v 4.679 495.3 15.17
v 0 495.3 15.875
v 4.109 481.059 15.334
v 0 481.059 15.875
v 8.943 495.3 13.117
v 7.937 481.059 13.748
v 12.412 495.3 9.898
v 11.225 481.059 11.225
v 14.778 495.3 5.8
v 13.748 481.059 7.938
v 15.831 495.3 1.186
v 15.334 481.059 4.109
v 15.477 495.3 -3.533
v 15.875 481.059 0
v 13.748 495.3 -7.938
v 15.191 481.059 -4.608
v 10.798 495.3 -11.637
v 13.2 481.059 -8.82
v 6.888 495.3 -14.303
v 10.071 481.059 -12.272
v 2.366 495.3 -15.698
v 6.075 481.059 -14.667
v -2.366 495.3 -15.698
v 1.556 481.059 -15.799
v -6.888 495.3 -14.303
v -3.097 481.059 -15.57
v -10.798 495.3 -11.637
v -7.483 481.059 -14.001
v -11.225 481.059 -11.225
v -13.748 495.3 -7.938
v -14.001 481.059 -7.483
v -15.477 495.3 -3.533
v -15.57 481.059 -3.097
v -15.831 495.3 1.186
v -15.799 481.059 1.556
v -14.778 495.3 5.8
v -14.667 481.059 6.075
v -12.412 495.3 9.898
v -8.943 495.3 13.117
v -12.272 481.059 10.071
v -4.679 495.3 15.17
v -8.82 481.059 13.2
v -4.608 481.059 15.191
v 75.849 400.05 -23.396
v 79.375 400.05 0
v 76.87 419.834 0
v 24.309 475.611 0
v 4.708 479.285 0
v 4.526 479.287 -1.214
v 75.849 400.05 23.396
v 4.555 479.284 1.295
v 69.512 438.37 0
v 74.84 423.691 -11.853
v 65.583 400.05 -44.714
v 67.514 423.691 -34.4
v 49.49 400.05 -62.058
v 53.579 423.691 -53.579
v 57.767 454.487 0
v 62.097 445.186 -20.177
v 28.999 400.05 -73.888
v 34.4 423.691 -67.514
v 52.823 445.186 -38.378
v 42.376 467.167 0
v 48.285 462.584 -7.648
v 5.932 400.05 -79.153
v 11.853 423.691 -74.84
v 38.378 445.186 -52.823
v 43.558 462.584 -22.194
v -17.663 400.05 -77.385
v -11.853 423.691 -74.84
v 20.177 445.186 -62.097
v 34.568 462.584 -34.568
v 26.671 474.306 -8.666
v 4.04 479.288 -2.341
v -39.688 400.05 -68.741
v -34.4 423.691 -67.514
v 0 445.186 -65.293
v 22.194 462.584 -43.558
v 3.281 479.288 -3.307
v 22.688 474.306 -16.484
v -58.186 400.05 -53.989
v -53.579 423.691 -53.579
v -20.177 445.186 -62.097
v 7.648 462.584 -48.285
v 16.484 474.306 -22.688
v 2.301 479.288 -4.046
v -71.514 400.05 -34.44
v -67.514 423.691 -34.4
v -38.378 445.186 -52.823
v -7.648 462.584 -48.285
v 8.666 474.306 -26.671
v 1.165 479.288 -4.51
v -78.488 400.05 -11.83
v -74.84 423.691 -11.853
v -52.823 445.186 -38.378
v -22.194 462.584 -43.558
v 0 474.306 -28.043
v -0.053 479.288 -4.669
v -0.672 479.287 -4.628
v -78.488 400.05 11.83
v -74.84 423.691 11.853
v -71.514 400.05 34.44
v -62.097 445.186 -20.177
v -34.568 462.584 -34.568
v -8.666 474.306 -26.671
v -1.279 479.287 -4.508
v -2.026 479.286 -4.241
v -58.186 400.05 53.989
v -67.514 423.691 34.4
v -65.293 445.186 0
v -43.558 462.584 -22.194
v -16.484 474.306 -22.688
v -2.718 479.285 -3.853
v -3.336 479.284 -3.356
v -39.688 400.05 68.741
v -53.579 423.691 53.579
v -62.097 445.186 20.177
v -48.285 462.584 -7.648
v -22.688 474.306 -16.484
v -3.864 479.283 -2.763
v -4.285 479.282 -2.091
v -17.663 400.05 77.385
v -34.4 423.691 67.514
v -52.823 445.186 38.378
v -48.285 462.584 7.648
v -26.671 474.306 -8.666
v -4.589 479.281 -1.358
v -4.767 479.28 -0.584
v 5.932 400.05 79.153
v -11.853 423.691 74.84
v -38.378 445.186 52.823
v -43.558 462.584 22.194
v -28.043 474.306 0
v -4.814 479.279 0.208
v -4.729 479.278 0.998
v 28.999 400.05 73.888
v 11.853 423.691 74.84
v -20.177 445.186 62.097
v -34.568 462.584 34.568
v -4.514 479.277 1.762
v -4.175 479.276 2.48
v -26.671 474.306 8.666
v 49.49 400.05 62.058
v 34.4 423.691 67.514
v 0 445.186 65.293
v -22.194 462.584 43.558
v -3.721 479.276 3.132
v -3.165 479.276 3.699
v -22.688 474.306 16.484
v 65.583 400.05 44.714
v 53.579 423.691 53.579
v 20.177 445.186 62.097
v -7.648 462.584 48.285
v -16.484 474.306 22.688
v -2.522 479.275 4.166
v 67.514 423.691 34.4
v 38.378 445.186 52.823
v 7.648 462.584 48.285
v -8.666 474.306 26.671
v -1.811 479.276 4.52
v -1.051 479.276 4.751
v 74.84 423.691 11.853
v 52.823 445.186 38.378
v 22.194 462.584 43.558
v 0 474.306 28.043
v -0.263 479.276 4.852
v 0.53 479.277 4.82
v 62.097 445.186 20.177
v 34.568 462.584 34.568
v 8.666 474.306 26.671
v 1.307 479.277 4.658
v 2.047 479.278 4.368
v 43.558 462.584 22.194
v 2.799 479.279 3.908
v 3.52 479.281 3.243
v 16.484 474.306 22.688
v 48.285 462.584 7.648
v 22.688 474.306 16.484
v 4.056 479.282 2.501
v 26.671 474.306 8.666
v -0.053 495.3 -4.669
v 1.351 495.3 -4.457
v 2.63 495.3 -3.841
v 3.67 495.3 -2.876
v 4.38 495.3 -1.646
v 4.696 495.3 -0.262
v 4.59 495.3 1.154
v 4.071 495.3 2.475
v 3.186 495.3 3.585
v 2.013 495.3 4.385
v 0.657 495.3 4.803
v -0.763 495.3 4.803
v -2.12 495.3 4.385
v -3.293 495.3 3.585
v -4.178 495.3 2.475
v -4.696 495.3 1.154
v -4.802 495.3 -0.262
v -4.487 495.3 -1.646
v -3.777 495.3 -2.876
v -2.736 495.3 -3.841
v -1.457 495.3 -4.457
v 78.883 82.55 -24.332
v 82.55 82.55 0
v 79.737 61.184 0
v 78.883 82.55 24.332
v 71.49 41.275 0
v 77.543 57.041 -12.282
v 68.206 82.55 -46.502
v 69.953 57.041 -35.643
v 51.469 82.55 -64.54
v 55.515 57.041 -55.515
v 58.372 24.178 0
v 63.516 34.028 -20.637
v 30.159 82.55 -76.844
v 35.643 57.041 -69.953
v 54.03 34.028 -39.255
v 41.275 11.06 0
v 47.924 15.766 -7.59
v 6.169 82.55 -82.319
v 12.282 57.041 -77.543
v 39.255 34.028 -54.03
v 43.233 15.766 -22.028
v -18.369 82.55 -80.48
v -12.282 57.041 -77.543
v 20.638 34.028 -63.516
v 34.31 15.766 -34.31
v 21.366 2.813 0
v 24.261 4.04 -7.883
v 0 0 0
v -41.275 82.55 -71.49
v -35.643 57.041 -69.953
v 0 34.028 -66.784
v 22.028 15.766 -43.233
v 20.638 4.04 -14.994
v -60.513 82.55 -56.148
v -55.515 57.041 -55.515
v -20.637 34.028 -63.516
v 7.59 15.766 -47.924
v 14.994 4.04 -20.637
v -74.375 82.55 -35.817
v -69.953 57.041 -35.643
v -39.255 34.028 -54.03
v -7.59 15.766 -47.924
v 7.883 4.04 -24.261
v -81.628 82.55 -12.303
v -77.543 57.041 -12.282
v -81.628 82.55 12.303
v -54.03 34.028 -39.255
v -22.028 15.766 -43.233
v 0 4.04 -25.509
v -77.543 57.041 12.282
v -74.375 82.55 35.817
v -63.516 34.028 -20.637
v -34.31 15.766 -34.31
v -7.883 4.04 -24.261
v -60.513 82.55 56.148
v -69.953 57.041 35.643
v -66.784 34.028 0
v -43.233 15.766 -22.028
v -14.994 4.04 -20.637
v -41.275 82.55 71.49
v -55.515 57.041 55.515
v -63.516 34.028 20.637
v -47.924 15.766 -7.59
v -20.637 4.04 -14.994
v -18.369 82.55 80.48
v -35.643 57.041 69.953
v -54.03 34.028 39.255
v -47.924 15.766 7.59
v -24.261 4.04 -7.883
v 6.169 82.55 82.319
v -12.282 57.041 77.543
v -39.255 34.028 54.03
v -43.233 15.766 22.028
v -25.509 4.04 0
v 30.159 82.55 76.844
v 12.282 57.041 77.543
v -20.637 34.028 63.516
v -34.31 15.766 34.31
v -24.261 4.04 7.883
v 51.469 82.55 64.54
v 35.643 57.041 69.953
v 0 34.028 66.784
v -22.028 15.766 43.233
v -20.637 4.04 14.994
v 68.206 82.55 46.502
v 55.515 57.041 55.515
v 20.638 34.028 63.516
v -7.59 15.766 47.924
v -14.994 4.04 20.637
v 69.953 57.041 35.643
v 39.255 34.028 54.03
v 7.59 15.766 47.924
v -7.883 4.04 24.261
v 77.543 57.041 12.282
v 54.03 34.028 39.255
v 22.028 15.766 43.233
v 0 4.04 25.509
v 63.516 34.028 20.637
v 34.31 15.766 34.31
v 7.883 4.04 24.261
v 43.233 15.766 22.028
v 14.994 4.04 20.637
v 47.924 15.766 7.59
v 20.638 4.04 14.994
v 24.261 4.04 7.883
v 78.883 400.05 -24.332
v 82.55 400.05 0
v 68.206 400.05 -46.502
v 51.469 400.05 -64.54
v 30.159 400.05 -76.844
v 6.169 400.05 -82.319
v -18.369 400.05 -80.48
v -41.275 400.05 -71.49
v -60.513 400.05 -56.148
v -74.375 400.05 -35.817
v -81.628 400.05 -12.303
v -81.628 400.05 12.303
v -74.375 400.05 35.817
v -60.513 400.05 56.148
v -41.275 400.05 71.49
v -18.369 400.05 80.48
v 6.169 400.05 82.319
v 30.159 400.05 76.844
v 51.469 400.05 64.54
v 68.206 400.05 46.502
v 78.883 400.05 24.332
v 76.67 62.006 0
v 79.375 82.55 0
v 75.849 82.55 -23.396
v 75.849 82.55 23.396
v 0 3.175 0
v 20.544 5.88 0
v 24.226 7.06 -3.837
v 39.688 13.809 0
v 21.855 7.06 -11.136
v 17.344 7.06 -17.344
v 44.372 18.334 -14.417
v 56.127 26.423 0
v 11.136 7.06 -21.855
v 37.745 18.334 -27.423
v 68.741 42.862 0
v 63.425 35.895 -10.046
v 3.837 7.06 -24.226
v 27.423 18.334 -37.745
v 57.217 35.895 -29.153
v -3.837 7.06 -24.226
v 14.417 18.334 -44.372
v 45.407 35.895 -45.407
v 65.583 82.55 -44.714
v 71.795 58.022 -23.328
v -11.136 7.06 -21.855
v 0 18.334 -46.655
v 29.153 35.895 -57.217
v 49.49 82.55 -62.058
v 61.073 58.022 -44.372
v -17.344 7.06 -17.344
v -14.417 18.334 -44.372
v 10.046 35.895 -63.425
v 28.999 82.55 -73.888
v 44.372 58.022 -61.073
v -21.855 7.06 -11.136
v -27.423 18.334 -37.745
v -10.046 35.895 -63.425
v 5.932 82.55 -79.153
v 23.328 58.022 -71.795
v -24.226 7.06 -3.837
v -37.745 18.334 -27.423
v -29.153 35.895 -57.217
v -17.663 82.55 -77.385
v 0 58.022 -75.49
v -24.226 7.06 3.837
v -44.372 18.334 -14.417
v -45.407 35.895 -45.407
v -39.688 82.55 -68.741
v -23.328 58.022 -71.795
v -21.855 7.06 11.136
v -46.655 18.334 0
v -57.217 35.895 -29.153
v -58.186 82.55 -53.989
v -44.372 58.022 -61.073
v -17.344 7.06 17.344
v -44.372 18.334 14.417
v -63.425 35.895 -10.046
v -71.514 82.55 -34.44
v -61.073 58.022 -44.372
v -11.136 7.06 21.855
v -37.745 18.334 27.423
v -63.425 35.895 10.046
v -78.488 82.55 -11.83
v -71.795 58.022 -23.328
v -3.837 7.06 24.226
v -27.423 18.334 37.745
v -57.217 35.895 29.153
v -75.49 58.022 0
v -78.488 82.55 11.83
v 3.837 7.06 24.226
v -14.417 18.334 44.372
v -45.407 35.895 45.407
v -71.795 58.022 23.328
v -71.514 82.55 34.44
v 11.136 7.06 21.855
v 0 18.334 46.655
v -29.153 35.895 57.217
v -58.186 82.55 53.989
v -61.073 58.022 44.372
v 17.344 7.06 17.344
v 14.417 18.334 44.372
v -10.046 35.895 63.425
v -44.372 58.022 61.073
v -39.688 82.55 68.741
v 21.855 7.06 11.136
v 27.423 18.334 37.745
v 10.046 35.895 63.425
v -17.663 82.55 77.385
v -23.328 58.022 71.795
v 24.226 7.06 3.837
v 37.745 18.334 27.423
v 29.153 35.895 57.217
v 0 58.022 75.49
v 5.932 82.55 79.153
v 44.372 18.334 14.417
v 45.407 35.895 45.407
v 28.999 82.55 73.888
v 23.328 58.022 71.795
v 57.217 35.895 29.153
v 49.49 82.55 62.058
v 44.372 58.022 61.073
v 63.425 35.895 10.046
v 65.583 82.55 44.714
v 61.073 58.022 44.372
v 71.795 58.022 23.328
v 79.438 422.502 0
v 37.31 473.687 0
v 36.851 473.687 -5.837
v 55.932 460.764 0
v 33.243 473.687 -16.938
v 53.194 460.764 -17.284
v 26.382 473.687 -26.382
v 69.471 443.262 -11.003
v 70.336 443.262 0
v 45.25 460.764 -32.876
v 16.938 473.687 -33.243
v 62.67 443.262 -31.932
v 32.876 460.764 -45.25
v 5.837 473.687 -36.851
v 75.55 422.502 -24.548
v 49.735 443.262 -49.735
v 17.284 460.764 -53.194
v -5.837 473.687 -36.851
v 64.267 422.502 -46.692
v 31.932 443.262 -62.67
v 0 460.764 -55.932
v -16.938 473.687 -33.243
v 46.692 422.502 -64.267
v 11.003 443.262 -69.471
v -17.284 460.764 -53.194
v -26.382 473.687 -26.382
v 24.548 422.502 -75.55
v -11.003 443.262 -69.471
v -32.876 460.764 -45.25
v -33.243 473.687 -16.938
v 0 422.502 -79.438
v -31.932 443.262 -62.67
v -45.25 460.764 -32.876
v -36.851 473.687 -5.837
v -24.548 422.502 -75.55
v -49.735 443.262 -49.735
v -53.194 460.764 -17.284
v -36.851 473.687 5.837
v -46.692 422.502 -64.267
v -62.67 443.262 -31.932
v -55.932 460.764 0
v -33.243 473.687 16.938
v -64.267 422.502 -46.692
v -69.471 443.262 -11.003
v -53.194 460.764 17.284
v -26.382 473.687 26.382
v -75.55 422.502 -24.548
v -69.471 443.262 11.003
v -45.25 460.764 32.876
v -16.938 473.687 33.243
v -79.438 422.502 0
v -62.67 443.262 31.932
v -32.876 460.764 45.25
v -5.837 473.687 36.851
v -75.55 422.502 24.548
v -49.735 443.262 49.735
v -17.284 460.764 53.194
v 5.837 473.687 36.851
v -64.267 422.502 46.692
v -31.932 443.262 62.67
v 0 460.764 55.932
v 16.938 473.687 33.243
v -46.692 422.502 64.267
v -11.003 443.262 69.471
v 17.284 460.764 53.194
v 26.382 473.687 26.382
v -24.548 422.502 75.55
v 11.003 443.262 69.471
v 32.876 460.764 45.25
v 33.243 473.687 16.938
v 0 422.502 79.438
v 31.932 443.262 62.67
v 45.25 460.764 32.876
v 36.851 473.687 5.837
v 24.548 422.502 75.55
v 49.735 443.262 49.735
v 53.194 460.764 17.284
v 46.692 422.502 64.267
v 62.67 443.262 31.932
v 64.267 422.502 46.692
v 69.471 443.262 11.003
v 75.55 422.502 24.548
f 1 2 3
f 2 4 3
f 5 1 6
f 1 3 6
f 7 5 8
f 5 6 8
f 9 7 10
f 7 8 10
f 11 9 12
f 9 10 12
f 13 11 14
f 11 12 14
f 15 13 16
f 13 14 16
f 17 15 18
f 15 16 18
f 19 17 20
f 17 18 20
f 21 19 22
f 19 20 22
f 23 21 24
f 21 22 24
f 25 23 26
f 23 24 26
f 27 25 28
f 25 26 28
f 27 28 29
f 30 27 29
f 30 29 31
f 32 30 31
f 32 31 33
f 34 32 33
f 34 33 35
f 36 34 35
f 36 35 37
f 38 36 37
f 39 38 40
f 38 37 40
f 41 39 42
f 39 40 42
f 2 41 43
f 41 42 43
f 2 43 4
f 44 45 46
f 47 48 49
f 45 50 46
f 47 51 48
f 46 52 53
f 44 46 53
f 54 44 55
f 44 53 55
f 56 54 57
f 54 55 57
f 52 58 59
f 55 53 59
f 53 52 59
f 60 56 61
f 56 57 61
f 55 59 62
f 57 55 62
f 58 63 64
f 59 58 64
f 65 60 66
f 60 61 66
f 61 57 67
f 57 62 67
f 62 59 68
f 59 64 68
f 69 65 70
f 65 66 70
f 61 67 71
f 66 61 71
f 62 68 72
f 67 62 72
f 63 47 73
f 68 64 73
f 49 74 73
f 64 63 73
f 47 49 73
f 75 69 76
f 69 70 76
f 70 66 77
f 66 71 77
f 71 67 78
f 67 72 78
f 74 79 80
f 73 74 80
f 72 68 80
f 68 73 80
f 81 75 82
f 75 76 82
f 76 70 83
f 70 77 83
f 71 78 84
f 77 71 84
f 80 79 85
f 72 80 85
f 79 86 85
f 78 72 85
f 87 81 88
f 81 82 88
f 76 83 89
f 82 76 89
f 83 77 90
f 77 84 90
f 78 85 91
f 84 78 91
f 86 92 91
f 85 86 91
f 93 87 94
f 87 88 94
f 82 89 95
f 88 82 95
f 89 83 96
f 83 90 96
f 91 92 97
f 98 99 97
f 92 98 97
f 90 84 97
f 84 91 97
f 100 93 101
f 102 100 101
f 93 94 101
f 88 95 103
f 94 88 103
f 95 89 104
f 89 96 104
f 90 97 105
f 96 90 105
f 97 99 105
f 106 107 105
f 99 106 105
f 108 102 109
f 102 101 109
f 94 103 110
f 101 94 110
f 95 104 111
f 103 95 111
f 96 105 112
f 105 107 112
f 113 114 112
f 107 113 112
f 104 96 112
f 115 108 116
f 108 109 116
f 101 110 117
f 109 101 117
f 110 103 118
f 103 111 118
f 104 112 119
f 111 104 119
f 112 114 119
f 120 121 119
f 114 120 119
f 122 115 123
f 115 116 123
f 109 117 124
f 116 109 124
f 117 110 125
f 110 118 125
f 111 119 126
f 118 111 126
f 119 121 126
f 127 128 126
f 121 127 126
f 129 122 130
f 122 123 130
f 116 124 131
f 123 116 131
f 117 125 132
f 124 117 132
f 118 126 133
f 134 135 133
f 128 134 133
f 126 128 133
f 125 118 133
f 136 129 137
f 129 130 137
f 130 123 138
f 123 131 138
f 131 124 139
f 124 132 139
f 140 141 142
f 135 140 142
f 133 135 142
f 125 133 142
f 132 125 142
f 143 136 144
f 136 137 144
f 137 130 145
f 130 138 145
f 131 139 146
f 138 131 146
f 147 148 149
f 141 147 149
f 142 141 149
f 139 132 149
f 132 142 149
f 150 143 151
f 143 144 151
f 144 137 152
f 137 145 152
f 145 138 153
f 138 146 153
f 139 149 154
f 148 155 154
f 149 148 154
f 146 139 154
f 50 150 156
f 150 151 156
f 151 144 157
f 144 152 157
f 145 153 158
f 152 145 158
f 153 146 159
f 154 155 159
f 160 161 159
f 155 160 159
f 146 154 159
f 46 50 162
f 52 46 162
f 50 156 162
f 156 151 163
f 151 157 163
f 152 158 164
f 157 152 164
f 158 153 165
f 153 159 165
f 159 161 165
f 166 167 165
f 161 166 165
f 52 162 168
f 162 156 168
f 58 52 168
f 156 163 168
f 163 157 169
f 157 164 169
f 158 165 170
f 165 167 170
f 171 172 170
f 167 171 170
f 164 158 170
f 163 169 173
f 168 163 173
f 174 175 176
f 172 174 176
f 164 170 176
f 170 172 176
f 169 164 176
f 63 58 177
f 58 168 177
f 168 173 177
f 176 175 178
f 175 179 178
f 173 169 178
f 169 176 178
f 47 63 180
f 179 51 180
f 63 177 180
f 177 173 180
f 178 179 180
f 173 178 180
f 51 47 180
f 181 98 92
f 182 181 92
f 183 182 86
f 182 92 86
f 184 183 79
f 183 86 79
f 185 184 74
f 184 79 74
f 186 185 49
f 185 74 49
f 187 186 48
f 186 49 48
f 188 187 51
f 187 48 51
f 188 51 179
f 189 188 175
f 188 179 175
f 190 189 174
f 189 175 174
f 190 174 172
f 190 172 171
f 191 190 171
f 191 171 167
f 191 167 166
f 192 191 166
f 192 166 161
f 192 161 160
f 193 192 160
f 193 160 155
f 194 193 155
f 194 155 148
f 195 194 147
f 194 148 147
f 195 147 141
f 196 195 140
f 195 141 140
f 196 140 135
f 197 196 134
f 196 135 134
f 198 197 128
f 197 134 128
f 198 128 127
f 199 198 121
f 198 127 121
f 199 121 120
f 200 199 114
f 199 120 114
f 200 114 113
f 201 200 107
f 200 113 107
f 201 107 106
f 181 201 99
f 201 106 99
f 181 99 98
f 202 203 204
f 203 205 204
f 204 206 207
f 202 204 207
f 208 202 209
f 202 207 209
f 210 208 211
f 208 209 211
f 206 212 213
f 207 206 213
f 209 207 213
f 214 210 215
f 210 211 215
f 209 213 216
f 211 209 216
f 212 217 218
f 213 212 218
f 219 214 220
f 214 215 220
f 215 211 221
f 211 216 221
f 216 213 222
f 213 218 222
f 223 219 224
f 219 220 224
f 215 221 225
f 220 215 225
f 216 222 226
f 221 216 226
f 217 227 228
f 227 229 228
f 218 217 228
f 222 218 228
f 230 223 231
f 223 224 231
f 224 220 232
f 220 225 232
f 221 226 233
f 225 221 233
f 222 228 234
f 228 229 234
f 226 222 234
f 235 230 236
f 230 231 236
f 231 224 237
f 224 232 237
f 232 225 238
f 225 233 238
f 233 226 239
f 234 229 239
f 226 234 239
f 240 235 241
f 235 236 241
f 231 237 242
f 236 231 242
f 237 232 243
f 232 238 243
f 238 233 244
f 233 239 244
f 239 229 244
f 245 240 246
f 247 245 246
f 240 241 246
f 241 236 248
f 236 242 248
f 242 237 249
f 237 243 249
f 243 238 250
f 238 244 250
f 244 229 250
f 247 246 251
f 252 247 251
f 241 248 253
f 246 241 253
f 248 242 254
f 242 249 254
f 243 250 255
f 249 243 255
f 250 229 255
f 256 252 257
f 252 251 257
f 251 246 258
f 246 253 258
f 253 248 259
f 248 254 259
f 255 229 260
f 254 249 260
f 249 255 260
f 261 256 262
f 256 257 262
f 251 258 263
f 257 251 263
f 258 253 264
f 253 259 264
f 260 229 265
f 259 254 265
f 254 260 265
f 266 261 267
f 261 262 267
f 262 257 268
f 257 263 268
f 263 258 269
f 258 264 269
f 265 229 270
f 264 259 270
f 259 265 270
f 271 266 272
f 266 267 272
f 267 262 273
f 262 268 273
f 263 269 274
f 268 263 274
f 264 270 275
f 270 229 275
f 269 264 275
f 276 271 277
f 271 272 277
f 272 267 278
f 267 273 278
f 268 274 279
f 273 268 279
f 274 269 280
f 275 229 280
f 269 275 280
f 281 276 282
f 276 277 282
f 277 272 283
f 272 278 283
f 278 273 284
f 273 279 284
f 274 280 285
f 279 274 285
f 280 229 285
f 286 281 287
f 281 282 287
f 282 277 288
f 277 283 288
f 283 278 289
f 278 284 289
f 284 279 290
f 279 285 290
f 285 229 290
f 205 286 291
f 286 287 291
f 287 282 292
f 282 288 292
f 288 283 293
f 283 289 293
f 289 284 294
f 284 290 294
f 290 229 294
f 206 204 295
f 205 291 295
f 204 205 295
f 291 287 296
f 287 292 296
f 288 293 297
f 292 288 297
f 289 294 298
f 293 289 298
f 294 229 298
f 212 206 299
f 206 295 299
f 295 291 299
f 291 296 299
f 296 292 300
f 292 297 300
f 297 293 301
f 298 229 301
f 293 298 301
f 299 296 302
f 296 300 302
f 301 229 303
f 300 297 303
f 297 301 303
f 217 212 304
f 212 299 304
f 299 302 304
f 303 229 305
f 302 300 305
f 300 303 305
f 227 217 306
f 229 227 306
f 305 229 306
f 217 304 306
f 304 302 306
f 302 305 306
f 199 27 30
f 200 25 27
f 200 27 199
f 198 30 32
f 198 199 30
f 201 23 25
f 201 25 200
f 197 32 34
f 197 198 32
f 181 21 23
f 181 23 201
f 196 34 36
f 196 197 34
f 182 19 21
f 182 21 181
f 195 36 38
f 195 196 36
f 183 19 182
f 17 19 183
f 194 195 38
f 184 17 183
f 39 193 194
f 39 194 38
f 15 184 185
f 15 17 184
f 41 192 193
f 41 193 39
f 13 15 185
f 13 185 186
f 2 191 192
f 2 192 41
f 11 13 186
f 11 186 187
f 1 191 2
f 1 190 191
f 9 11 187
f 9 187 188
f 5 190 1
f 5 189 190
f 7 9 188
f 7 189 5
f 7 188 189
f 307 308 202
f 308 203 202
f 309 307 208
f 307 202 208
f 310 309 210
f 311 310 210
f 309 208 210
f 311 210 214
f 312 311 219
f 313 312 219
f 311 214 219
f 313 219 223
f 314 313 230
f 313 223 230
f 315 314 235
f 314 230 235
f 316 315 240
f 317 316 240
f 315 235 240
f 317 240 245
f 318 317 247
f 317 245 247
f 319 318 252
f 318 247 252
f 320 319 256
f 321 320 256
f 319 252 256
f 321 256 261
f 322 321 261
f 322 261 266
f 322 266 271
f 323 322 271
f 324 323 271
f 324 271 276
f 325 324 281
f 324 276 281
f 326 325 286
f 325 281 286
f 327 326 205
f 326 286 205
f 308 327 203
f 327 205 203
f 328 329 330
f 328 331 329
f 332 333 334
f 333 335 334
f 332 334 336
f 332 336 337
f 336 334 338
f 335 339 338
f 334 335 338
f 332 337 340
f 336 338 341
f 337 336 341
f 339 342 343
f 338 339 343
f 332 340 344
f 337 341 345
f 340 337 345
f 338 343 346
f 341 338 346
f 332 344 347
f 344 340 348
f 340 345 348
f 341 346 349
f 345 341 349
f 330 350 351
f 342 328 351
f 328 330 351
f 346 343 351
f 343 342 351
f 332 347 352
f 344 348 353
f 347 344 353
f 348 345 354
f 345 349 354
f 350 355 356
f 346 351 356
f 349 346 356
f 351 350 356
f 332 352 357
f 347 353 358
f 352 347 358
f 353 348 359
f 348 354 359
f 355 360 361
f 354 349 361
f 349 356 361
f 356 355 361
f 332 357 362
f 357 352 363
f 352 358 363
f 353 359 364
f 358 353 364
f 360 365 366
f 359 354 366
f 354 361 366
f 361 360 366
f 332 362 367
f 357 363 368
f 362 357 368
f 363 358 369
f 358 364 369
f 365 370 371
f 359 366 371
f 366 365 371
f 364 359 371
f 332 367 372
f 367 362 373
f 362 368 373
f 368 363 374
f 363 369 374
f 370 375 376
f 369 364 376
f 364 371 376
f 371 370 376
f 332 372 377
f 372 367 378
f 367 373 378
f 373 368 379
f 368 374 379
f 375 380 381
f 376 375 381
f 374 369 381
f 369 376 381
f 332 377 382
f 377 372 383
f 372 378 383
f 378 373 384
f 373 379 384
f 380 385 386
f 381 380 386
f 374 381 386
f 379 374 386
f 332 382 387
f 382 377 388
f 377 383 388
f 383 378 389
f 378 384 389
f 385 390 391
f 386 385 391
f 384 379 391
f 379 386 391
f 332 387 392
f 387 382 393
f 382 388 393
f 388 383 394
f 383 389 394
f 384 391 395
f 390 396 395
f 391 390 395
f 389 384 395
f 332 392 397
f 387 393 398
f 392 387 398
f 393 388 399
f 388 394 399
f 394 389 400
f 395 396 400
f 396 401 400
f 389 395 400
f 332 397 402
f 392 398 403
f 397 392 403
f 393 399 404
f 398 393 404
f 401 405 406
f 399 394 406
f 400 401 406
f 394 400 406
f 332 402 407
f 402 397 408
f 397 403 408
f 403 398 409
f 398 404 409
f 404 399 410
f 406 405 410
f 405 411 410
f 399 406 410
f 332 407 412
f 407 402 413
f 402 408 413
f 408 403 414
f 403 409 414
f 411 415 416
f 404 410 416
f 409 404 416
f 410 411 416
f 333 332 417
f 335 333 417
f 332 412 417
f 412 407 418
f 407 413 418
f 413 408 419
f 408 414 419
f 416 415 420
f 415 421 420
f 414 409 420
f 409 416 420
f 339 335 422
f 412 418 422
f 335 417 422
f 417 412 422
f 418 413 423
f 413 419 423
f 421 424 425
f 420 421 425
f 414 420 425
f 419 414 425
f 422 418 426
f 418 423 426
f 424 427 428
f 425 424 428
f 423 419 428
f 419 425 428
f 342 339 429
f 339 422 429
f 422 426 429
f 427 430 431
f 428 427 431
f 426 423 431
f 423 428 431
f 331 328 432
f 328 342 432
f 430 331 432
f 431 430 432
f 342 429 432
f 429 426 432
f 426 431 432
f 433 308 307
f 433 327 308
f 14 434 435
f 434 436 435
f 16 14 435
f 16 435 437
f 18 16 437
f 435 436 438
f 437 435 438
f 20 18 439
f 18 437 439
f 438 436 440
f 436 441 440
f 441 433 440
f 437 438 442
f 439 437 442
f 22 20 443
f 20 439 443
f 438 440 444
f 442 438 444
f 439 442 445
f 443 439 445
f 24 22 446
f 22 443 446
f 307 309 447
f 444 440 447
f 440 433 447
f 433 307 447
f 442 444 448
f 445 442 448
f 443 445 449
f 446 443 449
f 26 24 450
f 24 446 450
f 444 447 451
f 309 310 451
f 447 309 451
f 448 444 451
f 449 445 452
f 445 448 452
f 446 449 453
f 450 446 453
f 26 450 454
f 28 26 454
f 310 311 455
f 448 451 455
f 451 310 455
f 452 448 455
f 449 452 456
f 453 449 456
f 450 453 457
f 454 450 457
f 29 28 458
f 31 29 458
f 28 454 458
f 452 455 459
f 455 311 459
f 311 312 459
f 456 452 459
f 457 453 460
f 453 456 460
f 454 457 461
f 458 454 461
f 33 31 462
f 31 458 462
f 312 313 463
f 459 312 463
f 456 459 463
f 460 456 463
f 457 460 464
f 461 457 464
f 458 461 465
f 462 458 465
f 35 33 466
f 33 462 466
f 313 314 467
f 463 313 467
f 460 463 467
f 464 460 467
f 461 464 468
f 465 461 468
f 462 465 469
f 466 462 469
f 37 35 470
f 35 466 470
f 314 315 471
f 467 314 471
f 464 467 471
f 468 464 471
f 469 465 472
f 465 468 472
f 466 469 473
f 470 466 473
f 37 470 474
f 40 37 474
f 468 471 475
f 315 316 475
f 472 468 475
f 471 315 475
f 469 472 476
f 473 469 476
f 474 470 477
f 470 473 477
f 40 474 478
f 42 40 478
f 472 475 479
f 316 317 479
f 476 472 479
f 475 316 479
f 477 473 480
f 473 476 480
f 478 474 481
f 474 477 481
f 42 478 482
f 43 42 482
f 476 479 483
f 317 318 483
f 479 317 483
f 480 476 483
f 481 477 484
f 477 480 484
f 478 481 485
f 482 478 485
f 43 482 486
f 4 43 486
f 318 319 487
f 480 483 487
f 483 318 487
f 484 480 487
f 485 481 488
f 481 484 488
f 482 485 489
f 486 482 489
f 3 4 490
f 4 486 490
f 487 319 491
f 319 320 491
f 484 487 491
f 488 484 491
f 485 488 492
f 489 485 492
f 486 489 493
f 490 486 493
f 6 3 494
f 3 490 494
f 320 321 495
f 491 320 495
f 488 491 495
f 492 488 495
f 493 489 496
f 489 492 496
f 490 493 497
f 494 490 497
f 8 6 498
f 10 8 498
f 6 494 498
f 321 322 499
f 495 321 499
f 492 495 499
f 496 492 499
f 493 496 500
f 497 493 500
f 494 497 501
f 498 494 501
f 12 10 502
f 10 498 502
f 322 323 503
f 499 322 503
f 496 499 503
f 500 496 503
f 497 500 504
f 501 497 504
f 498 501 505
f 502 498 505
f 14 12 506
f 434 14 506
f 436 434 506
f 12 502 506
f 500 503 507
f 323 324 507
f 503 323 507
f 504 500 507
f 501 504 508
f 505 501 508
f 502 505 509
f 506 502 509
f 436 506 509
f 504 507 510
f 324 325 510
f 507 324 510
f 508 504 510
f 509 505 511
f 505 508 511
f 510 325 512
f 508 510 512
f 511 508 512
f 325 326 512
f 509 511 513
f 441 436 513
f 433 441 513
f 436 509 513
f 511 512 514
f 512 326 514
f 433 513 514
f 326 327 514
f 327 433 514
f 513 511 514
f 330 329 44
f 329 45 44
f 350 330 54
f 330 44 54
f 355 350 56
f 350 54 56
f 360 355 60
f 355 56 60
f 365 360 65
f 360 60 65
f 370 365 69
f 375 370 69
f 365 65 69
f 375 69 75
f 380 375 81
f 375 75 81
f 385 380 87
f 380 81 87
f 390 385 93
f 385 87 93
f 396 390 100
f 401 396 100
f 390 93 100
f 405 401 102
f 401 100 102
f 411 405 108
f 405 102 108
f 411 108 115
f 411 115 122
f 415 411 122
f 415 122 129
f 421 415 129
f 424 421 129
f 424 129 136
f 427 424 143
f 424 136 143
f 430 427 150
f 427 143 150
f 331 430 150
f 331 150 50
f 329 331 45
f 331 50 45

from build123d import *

# Parameters (mm, degrees)
BOSS_EXTRUDE1_REACH              = 498.52
BOSS_EXTRUDE1_END_RADIUS         = 82.55
SKETCH2_R                        = 15.875
BOSS_EXTRUDE1_DIRECTION_2_DEPTH  = 12.7
F_3_8_0_375_DIAMETER_HOLE1_D     = 9.525
F_3_8_0_375_DIAMETER_HOLE1_DEPTH = 25.4
F_3_8_0_375_DIAMETER_HOLE1_TIP   = 2.861598698


with BuildPart() as part:
    # Sketch1 → Revolve1 (revolve)
    with BuildSketch(Plane.XY):
        with BuildLine():
            Line((82.55, 400.05), (82.55, 82.55))
            ThreePointArc((82.55, 82.55), (58.371664787, 24.178335213), (0, 0))
            Line((0, 0), (0, 3.175))
            ThreePointArc((0, 3.175), (56.126600757, 26.423399243), (79.375, 82.55))
            Line((79.375, 82.55), (79.375, 400.05))
            ThreePointArc((79.375, 400.05), (56.126600757, 456.176600757), (0, 479.425))
            Line((0, 479.425), (0, 482.6))
            ThreePointArc((0, 482.6), (58.371664787, 458.421664787), (82.55, 400.05))
        make_face()
    revolve(axis=Axis((0, 482.6, 0), (0, 1, 0)))

    # Boss-Extrude1: up to this sphere (the profile starts outside it)
    boss_extrude1_end = Location((0, 400.05, 0)) * Sphere(BOSS_EXTRUDE1_END_RADIUS, mode=Mode.PRIVATE)
    # Sketch2 → Boss-Extrude1 (add, up to the surface)
    with BuildSketch(Plane(origin=(0, 482.6, 0), x_dir=(1, 0, 0), z_dir=(0, 1, 0)), mode=Mode.PRIVATE) as boss_extrude1_sk1:
        with Locations(Location((0, 0, 0), (0, 0, 270))):
            Circle(SKETCH2_R)
    boss_extrude1_tool1 = extrude(boss_extrude1_sk1.sketch, amount=-BOSS_EXTRUDE1_REACH, mode=Mode.PRIVATE) - boss_extrude1_end
    add(boss_extrude1_tool1.solids().sort_by_distance((0, 482.6, 0))[0])

    # Sketch2 → Boss-Extrude1 direction 2 (add)
    with BuildSketch(Plane(origin=(0, 482.6, 0), x_dir=(1, 0, 0), z_dir=(0, 1, 0))):
        with Locations(Location((0, 0, 0), (0, 0, 270))):
            Circle(SKETCH2_R)
    extrude(amount=BOSS_EXTRUDE1_DIRECTION_2_DEPTH)

    # 3/8 (0.375) Diameter Hole1
    with Locations(Plane(origin=(-0.053238661, 495.3, 0.09377676), x_dir=(0, 0, 1), z_dir=(0, 1, 0))):
        with Locations((0, 0)):
            Hole(F_3_8_0_375_DIAMETER_HOLE1_D / 2, depth=F_3_8_0_375_DIAMETER_HOLE1_DEPTH)
            with Locations((0, 0, -(F_3_8_0_375_DIAMETER_HOLE1_DEPTH + F_3_8_0_375_DIAMETER_HOLE1_TIP / 2))):  # 118° drill point
                Cone(0, F_3_8_0_375_DIAMETER_HOLE1_D / 2, F_3_8_0_375_DIAMETER_HOLE1_TIP, mode=Mode.SUBTRACT)


solid = part.part
